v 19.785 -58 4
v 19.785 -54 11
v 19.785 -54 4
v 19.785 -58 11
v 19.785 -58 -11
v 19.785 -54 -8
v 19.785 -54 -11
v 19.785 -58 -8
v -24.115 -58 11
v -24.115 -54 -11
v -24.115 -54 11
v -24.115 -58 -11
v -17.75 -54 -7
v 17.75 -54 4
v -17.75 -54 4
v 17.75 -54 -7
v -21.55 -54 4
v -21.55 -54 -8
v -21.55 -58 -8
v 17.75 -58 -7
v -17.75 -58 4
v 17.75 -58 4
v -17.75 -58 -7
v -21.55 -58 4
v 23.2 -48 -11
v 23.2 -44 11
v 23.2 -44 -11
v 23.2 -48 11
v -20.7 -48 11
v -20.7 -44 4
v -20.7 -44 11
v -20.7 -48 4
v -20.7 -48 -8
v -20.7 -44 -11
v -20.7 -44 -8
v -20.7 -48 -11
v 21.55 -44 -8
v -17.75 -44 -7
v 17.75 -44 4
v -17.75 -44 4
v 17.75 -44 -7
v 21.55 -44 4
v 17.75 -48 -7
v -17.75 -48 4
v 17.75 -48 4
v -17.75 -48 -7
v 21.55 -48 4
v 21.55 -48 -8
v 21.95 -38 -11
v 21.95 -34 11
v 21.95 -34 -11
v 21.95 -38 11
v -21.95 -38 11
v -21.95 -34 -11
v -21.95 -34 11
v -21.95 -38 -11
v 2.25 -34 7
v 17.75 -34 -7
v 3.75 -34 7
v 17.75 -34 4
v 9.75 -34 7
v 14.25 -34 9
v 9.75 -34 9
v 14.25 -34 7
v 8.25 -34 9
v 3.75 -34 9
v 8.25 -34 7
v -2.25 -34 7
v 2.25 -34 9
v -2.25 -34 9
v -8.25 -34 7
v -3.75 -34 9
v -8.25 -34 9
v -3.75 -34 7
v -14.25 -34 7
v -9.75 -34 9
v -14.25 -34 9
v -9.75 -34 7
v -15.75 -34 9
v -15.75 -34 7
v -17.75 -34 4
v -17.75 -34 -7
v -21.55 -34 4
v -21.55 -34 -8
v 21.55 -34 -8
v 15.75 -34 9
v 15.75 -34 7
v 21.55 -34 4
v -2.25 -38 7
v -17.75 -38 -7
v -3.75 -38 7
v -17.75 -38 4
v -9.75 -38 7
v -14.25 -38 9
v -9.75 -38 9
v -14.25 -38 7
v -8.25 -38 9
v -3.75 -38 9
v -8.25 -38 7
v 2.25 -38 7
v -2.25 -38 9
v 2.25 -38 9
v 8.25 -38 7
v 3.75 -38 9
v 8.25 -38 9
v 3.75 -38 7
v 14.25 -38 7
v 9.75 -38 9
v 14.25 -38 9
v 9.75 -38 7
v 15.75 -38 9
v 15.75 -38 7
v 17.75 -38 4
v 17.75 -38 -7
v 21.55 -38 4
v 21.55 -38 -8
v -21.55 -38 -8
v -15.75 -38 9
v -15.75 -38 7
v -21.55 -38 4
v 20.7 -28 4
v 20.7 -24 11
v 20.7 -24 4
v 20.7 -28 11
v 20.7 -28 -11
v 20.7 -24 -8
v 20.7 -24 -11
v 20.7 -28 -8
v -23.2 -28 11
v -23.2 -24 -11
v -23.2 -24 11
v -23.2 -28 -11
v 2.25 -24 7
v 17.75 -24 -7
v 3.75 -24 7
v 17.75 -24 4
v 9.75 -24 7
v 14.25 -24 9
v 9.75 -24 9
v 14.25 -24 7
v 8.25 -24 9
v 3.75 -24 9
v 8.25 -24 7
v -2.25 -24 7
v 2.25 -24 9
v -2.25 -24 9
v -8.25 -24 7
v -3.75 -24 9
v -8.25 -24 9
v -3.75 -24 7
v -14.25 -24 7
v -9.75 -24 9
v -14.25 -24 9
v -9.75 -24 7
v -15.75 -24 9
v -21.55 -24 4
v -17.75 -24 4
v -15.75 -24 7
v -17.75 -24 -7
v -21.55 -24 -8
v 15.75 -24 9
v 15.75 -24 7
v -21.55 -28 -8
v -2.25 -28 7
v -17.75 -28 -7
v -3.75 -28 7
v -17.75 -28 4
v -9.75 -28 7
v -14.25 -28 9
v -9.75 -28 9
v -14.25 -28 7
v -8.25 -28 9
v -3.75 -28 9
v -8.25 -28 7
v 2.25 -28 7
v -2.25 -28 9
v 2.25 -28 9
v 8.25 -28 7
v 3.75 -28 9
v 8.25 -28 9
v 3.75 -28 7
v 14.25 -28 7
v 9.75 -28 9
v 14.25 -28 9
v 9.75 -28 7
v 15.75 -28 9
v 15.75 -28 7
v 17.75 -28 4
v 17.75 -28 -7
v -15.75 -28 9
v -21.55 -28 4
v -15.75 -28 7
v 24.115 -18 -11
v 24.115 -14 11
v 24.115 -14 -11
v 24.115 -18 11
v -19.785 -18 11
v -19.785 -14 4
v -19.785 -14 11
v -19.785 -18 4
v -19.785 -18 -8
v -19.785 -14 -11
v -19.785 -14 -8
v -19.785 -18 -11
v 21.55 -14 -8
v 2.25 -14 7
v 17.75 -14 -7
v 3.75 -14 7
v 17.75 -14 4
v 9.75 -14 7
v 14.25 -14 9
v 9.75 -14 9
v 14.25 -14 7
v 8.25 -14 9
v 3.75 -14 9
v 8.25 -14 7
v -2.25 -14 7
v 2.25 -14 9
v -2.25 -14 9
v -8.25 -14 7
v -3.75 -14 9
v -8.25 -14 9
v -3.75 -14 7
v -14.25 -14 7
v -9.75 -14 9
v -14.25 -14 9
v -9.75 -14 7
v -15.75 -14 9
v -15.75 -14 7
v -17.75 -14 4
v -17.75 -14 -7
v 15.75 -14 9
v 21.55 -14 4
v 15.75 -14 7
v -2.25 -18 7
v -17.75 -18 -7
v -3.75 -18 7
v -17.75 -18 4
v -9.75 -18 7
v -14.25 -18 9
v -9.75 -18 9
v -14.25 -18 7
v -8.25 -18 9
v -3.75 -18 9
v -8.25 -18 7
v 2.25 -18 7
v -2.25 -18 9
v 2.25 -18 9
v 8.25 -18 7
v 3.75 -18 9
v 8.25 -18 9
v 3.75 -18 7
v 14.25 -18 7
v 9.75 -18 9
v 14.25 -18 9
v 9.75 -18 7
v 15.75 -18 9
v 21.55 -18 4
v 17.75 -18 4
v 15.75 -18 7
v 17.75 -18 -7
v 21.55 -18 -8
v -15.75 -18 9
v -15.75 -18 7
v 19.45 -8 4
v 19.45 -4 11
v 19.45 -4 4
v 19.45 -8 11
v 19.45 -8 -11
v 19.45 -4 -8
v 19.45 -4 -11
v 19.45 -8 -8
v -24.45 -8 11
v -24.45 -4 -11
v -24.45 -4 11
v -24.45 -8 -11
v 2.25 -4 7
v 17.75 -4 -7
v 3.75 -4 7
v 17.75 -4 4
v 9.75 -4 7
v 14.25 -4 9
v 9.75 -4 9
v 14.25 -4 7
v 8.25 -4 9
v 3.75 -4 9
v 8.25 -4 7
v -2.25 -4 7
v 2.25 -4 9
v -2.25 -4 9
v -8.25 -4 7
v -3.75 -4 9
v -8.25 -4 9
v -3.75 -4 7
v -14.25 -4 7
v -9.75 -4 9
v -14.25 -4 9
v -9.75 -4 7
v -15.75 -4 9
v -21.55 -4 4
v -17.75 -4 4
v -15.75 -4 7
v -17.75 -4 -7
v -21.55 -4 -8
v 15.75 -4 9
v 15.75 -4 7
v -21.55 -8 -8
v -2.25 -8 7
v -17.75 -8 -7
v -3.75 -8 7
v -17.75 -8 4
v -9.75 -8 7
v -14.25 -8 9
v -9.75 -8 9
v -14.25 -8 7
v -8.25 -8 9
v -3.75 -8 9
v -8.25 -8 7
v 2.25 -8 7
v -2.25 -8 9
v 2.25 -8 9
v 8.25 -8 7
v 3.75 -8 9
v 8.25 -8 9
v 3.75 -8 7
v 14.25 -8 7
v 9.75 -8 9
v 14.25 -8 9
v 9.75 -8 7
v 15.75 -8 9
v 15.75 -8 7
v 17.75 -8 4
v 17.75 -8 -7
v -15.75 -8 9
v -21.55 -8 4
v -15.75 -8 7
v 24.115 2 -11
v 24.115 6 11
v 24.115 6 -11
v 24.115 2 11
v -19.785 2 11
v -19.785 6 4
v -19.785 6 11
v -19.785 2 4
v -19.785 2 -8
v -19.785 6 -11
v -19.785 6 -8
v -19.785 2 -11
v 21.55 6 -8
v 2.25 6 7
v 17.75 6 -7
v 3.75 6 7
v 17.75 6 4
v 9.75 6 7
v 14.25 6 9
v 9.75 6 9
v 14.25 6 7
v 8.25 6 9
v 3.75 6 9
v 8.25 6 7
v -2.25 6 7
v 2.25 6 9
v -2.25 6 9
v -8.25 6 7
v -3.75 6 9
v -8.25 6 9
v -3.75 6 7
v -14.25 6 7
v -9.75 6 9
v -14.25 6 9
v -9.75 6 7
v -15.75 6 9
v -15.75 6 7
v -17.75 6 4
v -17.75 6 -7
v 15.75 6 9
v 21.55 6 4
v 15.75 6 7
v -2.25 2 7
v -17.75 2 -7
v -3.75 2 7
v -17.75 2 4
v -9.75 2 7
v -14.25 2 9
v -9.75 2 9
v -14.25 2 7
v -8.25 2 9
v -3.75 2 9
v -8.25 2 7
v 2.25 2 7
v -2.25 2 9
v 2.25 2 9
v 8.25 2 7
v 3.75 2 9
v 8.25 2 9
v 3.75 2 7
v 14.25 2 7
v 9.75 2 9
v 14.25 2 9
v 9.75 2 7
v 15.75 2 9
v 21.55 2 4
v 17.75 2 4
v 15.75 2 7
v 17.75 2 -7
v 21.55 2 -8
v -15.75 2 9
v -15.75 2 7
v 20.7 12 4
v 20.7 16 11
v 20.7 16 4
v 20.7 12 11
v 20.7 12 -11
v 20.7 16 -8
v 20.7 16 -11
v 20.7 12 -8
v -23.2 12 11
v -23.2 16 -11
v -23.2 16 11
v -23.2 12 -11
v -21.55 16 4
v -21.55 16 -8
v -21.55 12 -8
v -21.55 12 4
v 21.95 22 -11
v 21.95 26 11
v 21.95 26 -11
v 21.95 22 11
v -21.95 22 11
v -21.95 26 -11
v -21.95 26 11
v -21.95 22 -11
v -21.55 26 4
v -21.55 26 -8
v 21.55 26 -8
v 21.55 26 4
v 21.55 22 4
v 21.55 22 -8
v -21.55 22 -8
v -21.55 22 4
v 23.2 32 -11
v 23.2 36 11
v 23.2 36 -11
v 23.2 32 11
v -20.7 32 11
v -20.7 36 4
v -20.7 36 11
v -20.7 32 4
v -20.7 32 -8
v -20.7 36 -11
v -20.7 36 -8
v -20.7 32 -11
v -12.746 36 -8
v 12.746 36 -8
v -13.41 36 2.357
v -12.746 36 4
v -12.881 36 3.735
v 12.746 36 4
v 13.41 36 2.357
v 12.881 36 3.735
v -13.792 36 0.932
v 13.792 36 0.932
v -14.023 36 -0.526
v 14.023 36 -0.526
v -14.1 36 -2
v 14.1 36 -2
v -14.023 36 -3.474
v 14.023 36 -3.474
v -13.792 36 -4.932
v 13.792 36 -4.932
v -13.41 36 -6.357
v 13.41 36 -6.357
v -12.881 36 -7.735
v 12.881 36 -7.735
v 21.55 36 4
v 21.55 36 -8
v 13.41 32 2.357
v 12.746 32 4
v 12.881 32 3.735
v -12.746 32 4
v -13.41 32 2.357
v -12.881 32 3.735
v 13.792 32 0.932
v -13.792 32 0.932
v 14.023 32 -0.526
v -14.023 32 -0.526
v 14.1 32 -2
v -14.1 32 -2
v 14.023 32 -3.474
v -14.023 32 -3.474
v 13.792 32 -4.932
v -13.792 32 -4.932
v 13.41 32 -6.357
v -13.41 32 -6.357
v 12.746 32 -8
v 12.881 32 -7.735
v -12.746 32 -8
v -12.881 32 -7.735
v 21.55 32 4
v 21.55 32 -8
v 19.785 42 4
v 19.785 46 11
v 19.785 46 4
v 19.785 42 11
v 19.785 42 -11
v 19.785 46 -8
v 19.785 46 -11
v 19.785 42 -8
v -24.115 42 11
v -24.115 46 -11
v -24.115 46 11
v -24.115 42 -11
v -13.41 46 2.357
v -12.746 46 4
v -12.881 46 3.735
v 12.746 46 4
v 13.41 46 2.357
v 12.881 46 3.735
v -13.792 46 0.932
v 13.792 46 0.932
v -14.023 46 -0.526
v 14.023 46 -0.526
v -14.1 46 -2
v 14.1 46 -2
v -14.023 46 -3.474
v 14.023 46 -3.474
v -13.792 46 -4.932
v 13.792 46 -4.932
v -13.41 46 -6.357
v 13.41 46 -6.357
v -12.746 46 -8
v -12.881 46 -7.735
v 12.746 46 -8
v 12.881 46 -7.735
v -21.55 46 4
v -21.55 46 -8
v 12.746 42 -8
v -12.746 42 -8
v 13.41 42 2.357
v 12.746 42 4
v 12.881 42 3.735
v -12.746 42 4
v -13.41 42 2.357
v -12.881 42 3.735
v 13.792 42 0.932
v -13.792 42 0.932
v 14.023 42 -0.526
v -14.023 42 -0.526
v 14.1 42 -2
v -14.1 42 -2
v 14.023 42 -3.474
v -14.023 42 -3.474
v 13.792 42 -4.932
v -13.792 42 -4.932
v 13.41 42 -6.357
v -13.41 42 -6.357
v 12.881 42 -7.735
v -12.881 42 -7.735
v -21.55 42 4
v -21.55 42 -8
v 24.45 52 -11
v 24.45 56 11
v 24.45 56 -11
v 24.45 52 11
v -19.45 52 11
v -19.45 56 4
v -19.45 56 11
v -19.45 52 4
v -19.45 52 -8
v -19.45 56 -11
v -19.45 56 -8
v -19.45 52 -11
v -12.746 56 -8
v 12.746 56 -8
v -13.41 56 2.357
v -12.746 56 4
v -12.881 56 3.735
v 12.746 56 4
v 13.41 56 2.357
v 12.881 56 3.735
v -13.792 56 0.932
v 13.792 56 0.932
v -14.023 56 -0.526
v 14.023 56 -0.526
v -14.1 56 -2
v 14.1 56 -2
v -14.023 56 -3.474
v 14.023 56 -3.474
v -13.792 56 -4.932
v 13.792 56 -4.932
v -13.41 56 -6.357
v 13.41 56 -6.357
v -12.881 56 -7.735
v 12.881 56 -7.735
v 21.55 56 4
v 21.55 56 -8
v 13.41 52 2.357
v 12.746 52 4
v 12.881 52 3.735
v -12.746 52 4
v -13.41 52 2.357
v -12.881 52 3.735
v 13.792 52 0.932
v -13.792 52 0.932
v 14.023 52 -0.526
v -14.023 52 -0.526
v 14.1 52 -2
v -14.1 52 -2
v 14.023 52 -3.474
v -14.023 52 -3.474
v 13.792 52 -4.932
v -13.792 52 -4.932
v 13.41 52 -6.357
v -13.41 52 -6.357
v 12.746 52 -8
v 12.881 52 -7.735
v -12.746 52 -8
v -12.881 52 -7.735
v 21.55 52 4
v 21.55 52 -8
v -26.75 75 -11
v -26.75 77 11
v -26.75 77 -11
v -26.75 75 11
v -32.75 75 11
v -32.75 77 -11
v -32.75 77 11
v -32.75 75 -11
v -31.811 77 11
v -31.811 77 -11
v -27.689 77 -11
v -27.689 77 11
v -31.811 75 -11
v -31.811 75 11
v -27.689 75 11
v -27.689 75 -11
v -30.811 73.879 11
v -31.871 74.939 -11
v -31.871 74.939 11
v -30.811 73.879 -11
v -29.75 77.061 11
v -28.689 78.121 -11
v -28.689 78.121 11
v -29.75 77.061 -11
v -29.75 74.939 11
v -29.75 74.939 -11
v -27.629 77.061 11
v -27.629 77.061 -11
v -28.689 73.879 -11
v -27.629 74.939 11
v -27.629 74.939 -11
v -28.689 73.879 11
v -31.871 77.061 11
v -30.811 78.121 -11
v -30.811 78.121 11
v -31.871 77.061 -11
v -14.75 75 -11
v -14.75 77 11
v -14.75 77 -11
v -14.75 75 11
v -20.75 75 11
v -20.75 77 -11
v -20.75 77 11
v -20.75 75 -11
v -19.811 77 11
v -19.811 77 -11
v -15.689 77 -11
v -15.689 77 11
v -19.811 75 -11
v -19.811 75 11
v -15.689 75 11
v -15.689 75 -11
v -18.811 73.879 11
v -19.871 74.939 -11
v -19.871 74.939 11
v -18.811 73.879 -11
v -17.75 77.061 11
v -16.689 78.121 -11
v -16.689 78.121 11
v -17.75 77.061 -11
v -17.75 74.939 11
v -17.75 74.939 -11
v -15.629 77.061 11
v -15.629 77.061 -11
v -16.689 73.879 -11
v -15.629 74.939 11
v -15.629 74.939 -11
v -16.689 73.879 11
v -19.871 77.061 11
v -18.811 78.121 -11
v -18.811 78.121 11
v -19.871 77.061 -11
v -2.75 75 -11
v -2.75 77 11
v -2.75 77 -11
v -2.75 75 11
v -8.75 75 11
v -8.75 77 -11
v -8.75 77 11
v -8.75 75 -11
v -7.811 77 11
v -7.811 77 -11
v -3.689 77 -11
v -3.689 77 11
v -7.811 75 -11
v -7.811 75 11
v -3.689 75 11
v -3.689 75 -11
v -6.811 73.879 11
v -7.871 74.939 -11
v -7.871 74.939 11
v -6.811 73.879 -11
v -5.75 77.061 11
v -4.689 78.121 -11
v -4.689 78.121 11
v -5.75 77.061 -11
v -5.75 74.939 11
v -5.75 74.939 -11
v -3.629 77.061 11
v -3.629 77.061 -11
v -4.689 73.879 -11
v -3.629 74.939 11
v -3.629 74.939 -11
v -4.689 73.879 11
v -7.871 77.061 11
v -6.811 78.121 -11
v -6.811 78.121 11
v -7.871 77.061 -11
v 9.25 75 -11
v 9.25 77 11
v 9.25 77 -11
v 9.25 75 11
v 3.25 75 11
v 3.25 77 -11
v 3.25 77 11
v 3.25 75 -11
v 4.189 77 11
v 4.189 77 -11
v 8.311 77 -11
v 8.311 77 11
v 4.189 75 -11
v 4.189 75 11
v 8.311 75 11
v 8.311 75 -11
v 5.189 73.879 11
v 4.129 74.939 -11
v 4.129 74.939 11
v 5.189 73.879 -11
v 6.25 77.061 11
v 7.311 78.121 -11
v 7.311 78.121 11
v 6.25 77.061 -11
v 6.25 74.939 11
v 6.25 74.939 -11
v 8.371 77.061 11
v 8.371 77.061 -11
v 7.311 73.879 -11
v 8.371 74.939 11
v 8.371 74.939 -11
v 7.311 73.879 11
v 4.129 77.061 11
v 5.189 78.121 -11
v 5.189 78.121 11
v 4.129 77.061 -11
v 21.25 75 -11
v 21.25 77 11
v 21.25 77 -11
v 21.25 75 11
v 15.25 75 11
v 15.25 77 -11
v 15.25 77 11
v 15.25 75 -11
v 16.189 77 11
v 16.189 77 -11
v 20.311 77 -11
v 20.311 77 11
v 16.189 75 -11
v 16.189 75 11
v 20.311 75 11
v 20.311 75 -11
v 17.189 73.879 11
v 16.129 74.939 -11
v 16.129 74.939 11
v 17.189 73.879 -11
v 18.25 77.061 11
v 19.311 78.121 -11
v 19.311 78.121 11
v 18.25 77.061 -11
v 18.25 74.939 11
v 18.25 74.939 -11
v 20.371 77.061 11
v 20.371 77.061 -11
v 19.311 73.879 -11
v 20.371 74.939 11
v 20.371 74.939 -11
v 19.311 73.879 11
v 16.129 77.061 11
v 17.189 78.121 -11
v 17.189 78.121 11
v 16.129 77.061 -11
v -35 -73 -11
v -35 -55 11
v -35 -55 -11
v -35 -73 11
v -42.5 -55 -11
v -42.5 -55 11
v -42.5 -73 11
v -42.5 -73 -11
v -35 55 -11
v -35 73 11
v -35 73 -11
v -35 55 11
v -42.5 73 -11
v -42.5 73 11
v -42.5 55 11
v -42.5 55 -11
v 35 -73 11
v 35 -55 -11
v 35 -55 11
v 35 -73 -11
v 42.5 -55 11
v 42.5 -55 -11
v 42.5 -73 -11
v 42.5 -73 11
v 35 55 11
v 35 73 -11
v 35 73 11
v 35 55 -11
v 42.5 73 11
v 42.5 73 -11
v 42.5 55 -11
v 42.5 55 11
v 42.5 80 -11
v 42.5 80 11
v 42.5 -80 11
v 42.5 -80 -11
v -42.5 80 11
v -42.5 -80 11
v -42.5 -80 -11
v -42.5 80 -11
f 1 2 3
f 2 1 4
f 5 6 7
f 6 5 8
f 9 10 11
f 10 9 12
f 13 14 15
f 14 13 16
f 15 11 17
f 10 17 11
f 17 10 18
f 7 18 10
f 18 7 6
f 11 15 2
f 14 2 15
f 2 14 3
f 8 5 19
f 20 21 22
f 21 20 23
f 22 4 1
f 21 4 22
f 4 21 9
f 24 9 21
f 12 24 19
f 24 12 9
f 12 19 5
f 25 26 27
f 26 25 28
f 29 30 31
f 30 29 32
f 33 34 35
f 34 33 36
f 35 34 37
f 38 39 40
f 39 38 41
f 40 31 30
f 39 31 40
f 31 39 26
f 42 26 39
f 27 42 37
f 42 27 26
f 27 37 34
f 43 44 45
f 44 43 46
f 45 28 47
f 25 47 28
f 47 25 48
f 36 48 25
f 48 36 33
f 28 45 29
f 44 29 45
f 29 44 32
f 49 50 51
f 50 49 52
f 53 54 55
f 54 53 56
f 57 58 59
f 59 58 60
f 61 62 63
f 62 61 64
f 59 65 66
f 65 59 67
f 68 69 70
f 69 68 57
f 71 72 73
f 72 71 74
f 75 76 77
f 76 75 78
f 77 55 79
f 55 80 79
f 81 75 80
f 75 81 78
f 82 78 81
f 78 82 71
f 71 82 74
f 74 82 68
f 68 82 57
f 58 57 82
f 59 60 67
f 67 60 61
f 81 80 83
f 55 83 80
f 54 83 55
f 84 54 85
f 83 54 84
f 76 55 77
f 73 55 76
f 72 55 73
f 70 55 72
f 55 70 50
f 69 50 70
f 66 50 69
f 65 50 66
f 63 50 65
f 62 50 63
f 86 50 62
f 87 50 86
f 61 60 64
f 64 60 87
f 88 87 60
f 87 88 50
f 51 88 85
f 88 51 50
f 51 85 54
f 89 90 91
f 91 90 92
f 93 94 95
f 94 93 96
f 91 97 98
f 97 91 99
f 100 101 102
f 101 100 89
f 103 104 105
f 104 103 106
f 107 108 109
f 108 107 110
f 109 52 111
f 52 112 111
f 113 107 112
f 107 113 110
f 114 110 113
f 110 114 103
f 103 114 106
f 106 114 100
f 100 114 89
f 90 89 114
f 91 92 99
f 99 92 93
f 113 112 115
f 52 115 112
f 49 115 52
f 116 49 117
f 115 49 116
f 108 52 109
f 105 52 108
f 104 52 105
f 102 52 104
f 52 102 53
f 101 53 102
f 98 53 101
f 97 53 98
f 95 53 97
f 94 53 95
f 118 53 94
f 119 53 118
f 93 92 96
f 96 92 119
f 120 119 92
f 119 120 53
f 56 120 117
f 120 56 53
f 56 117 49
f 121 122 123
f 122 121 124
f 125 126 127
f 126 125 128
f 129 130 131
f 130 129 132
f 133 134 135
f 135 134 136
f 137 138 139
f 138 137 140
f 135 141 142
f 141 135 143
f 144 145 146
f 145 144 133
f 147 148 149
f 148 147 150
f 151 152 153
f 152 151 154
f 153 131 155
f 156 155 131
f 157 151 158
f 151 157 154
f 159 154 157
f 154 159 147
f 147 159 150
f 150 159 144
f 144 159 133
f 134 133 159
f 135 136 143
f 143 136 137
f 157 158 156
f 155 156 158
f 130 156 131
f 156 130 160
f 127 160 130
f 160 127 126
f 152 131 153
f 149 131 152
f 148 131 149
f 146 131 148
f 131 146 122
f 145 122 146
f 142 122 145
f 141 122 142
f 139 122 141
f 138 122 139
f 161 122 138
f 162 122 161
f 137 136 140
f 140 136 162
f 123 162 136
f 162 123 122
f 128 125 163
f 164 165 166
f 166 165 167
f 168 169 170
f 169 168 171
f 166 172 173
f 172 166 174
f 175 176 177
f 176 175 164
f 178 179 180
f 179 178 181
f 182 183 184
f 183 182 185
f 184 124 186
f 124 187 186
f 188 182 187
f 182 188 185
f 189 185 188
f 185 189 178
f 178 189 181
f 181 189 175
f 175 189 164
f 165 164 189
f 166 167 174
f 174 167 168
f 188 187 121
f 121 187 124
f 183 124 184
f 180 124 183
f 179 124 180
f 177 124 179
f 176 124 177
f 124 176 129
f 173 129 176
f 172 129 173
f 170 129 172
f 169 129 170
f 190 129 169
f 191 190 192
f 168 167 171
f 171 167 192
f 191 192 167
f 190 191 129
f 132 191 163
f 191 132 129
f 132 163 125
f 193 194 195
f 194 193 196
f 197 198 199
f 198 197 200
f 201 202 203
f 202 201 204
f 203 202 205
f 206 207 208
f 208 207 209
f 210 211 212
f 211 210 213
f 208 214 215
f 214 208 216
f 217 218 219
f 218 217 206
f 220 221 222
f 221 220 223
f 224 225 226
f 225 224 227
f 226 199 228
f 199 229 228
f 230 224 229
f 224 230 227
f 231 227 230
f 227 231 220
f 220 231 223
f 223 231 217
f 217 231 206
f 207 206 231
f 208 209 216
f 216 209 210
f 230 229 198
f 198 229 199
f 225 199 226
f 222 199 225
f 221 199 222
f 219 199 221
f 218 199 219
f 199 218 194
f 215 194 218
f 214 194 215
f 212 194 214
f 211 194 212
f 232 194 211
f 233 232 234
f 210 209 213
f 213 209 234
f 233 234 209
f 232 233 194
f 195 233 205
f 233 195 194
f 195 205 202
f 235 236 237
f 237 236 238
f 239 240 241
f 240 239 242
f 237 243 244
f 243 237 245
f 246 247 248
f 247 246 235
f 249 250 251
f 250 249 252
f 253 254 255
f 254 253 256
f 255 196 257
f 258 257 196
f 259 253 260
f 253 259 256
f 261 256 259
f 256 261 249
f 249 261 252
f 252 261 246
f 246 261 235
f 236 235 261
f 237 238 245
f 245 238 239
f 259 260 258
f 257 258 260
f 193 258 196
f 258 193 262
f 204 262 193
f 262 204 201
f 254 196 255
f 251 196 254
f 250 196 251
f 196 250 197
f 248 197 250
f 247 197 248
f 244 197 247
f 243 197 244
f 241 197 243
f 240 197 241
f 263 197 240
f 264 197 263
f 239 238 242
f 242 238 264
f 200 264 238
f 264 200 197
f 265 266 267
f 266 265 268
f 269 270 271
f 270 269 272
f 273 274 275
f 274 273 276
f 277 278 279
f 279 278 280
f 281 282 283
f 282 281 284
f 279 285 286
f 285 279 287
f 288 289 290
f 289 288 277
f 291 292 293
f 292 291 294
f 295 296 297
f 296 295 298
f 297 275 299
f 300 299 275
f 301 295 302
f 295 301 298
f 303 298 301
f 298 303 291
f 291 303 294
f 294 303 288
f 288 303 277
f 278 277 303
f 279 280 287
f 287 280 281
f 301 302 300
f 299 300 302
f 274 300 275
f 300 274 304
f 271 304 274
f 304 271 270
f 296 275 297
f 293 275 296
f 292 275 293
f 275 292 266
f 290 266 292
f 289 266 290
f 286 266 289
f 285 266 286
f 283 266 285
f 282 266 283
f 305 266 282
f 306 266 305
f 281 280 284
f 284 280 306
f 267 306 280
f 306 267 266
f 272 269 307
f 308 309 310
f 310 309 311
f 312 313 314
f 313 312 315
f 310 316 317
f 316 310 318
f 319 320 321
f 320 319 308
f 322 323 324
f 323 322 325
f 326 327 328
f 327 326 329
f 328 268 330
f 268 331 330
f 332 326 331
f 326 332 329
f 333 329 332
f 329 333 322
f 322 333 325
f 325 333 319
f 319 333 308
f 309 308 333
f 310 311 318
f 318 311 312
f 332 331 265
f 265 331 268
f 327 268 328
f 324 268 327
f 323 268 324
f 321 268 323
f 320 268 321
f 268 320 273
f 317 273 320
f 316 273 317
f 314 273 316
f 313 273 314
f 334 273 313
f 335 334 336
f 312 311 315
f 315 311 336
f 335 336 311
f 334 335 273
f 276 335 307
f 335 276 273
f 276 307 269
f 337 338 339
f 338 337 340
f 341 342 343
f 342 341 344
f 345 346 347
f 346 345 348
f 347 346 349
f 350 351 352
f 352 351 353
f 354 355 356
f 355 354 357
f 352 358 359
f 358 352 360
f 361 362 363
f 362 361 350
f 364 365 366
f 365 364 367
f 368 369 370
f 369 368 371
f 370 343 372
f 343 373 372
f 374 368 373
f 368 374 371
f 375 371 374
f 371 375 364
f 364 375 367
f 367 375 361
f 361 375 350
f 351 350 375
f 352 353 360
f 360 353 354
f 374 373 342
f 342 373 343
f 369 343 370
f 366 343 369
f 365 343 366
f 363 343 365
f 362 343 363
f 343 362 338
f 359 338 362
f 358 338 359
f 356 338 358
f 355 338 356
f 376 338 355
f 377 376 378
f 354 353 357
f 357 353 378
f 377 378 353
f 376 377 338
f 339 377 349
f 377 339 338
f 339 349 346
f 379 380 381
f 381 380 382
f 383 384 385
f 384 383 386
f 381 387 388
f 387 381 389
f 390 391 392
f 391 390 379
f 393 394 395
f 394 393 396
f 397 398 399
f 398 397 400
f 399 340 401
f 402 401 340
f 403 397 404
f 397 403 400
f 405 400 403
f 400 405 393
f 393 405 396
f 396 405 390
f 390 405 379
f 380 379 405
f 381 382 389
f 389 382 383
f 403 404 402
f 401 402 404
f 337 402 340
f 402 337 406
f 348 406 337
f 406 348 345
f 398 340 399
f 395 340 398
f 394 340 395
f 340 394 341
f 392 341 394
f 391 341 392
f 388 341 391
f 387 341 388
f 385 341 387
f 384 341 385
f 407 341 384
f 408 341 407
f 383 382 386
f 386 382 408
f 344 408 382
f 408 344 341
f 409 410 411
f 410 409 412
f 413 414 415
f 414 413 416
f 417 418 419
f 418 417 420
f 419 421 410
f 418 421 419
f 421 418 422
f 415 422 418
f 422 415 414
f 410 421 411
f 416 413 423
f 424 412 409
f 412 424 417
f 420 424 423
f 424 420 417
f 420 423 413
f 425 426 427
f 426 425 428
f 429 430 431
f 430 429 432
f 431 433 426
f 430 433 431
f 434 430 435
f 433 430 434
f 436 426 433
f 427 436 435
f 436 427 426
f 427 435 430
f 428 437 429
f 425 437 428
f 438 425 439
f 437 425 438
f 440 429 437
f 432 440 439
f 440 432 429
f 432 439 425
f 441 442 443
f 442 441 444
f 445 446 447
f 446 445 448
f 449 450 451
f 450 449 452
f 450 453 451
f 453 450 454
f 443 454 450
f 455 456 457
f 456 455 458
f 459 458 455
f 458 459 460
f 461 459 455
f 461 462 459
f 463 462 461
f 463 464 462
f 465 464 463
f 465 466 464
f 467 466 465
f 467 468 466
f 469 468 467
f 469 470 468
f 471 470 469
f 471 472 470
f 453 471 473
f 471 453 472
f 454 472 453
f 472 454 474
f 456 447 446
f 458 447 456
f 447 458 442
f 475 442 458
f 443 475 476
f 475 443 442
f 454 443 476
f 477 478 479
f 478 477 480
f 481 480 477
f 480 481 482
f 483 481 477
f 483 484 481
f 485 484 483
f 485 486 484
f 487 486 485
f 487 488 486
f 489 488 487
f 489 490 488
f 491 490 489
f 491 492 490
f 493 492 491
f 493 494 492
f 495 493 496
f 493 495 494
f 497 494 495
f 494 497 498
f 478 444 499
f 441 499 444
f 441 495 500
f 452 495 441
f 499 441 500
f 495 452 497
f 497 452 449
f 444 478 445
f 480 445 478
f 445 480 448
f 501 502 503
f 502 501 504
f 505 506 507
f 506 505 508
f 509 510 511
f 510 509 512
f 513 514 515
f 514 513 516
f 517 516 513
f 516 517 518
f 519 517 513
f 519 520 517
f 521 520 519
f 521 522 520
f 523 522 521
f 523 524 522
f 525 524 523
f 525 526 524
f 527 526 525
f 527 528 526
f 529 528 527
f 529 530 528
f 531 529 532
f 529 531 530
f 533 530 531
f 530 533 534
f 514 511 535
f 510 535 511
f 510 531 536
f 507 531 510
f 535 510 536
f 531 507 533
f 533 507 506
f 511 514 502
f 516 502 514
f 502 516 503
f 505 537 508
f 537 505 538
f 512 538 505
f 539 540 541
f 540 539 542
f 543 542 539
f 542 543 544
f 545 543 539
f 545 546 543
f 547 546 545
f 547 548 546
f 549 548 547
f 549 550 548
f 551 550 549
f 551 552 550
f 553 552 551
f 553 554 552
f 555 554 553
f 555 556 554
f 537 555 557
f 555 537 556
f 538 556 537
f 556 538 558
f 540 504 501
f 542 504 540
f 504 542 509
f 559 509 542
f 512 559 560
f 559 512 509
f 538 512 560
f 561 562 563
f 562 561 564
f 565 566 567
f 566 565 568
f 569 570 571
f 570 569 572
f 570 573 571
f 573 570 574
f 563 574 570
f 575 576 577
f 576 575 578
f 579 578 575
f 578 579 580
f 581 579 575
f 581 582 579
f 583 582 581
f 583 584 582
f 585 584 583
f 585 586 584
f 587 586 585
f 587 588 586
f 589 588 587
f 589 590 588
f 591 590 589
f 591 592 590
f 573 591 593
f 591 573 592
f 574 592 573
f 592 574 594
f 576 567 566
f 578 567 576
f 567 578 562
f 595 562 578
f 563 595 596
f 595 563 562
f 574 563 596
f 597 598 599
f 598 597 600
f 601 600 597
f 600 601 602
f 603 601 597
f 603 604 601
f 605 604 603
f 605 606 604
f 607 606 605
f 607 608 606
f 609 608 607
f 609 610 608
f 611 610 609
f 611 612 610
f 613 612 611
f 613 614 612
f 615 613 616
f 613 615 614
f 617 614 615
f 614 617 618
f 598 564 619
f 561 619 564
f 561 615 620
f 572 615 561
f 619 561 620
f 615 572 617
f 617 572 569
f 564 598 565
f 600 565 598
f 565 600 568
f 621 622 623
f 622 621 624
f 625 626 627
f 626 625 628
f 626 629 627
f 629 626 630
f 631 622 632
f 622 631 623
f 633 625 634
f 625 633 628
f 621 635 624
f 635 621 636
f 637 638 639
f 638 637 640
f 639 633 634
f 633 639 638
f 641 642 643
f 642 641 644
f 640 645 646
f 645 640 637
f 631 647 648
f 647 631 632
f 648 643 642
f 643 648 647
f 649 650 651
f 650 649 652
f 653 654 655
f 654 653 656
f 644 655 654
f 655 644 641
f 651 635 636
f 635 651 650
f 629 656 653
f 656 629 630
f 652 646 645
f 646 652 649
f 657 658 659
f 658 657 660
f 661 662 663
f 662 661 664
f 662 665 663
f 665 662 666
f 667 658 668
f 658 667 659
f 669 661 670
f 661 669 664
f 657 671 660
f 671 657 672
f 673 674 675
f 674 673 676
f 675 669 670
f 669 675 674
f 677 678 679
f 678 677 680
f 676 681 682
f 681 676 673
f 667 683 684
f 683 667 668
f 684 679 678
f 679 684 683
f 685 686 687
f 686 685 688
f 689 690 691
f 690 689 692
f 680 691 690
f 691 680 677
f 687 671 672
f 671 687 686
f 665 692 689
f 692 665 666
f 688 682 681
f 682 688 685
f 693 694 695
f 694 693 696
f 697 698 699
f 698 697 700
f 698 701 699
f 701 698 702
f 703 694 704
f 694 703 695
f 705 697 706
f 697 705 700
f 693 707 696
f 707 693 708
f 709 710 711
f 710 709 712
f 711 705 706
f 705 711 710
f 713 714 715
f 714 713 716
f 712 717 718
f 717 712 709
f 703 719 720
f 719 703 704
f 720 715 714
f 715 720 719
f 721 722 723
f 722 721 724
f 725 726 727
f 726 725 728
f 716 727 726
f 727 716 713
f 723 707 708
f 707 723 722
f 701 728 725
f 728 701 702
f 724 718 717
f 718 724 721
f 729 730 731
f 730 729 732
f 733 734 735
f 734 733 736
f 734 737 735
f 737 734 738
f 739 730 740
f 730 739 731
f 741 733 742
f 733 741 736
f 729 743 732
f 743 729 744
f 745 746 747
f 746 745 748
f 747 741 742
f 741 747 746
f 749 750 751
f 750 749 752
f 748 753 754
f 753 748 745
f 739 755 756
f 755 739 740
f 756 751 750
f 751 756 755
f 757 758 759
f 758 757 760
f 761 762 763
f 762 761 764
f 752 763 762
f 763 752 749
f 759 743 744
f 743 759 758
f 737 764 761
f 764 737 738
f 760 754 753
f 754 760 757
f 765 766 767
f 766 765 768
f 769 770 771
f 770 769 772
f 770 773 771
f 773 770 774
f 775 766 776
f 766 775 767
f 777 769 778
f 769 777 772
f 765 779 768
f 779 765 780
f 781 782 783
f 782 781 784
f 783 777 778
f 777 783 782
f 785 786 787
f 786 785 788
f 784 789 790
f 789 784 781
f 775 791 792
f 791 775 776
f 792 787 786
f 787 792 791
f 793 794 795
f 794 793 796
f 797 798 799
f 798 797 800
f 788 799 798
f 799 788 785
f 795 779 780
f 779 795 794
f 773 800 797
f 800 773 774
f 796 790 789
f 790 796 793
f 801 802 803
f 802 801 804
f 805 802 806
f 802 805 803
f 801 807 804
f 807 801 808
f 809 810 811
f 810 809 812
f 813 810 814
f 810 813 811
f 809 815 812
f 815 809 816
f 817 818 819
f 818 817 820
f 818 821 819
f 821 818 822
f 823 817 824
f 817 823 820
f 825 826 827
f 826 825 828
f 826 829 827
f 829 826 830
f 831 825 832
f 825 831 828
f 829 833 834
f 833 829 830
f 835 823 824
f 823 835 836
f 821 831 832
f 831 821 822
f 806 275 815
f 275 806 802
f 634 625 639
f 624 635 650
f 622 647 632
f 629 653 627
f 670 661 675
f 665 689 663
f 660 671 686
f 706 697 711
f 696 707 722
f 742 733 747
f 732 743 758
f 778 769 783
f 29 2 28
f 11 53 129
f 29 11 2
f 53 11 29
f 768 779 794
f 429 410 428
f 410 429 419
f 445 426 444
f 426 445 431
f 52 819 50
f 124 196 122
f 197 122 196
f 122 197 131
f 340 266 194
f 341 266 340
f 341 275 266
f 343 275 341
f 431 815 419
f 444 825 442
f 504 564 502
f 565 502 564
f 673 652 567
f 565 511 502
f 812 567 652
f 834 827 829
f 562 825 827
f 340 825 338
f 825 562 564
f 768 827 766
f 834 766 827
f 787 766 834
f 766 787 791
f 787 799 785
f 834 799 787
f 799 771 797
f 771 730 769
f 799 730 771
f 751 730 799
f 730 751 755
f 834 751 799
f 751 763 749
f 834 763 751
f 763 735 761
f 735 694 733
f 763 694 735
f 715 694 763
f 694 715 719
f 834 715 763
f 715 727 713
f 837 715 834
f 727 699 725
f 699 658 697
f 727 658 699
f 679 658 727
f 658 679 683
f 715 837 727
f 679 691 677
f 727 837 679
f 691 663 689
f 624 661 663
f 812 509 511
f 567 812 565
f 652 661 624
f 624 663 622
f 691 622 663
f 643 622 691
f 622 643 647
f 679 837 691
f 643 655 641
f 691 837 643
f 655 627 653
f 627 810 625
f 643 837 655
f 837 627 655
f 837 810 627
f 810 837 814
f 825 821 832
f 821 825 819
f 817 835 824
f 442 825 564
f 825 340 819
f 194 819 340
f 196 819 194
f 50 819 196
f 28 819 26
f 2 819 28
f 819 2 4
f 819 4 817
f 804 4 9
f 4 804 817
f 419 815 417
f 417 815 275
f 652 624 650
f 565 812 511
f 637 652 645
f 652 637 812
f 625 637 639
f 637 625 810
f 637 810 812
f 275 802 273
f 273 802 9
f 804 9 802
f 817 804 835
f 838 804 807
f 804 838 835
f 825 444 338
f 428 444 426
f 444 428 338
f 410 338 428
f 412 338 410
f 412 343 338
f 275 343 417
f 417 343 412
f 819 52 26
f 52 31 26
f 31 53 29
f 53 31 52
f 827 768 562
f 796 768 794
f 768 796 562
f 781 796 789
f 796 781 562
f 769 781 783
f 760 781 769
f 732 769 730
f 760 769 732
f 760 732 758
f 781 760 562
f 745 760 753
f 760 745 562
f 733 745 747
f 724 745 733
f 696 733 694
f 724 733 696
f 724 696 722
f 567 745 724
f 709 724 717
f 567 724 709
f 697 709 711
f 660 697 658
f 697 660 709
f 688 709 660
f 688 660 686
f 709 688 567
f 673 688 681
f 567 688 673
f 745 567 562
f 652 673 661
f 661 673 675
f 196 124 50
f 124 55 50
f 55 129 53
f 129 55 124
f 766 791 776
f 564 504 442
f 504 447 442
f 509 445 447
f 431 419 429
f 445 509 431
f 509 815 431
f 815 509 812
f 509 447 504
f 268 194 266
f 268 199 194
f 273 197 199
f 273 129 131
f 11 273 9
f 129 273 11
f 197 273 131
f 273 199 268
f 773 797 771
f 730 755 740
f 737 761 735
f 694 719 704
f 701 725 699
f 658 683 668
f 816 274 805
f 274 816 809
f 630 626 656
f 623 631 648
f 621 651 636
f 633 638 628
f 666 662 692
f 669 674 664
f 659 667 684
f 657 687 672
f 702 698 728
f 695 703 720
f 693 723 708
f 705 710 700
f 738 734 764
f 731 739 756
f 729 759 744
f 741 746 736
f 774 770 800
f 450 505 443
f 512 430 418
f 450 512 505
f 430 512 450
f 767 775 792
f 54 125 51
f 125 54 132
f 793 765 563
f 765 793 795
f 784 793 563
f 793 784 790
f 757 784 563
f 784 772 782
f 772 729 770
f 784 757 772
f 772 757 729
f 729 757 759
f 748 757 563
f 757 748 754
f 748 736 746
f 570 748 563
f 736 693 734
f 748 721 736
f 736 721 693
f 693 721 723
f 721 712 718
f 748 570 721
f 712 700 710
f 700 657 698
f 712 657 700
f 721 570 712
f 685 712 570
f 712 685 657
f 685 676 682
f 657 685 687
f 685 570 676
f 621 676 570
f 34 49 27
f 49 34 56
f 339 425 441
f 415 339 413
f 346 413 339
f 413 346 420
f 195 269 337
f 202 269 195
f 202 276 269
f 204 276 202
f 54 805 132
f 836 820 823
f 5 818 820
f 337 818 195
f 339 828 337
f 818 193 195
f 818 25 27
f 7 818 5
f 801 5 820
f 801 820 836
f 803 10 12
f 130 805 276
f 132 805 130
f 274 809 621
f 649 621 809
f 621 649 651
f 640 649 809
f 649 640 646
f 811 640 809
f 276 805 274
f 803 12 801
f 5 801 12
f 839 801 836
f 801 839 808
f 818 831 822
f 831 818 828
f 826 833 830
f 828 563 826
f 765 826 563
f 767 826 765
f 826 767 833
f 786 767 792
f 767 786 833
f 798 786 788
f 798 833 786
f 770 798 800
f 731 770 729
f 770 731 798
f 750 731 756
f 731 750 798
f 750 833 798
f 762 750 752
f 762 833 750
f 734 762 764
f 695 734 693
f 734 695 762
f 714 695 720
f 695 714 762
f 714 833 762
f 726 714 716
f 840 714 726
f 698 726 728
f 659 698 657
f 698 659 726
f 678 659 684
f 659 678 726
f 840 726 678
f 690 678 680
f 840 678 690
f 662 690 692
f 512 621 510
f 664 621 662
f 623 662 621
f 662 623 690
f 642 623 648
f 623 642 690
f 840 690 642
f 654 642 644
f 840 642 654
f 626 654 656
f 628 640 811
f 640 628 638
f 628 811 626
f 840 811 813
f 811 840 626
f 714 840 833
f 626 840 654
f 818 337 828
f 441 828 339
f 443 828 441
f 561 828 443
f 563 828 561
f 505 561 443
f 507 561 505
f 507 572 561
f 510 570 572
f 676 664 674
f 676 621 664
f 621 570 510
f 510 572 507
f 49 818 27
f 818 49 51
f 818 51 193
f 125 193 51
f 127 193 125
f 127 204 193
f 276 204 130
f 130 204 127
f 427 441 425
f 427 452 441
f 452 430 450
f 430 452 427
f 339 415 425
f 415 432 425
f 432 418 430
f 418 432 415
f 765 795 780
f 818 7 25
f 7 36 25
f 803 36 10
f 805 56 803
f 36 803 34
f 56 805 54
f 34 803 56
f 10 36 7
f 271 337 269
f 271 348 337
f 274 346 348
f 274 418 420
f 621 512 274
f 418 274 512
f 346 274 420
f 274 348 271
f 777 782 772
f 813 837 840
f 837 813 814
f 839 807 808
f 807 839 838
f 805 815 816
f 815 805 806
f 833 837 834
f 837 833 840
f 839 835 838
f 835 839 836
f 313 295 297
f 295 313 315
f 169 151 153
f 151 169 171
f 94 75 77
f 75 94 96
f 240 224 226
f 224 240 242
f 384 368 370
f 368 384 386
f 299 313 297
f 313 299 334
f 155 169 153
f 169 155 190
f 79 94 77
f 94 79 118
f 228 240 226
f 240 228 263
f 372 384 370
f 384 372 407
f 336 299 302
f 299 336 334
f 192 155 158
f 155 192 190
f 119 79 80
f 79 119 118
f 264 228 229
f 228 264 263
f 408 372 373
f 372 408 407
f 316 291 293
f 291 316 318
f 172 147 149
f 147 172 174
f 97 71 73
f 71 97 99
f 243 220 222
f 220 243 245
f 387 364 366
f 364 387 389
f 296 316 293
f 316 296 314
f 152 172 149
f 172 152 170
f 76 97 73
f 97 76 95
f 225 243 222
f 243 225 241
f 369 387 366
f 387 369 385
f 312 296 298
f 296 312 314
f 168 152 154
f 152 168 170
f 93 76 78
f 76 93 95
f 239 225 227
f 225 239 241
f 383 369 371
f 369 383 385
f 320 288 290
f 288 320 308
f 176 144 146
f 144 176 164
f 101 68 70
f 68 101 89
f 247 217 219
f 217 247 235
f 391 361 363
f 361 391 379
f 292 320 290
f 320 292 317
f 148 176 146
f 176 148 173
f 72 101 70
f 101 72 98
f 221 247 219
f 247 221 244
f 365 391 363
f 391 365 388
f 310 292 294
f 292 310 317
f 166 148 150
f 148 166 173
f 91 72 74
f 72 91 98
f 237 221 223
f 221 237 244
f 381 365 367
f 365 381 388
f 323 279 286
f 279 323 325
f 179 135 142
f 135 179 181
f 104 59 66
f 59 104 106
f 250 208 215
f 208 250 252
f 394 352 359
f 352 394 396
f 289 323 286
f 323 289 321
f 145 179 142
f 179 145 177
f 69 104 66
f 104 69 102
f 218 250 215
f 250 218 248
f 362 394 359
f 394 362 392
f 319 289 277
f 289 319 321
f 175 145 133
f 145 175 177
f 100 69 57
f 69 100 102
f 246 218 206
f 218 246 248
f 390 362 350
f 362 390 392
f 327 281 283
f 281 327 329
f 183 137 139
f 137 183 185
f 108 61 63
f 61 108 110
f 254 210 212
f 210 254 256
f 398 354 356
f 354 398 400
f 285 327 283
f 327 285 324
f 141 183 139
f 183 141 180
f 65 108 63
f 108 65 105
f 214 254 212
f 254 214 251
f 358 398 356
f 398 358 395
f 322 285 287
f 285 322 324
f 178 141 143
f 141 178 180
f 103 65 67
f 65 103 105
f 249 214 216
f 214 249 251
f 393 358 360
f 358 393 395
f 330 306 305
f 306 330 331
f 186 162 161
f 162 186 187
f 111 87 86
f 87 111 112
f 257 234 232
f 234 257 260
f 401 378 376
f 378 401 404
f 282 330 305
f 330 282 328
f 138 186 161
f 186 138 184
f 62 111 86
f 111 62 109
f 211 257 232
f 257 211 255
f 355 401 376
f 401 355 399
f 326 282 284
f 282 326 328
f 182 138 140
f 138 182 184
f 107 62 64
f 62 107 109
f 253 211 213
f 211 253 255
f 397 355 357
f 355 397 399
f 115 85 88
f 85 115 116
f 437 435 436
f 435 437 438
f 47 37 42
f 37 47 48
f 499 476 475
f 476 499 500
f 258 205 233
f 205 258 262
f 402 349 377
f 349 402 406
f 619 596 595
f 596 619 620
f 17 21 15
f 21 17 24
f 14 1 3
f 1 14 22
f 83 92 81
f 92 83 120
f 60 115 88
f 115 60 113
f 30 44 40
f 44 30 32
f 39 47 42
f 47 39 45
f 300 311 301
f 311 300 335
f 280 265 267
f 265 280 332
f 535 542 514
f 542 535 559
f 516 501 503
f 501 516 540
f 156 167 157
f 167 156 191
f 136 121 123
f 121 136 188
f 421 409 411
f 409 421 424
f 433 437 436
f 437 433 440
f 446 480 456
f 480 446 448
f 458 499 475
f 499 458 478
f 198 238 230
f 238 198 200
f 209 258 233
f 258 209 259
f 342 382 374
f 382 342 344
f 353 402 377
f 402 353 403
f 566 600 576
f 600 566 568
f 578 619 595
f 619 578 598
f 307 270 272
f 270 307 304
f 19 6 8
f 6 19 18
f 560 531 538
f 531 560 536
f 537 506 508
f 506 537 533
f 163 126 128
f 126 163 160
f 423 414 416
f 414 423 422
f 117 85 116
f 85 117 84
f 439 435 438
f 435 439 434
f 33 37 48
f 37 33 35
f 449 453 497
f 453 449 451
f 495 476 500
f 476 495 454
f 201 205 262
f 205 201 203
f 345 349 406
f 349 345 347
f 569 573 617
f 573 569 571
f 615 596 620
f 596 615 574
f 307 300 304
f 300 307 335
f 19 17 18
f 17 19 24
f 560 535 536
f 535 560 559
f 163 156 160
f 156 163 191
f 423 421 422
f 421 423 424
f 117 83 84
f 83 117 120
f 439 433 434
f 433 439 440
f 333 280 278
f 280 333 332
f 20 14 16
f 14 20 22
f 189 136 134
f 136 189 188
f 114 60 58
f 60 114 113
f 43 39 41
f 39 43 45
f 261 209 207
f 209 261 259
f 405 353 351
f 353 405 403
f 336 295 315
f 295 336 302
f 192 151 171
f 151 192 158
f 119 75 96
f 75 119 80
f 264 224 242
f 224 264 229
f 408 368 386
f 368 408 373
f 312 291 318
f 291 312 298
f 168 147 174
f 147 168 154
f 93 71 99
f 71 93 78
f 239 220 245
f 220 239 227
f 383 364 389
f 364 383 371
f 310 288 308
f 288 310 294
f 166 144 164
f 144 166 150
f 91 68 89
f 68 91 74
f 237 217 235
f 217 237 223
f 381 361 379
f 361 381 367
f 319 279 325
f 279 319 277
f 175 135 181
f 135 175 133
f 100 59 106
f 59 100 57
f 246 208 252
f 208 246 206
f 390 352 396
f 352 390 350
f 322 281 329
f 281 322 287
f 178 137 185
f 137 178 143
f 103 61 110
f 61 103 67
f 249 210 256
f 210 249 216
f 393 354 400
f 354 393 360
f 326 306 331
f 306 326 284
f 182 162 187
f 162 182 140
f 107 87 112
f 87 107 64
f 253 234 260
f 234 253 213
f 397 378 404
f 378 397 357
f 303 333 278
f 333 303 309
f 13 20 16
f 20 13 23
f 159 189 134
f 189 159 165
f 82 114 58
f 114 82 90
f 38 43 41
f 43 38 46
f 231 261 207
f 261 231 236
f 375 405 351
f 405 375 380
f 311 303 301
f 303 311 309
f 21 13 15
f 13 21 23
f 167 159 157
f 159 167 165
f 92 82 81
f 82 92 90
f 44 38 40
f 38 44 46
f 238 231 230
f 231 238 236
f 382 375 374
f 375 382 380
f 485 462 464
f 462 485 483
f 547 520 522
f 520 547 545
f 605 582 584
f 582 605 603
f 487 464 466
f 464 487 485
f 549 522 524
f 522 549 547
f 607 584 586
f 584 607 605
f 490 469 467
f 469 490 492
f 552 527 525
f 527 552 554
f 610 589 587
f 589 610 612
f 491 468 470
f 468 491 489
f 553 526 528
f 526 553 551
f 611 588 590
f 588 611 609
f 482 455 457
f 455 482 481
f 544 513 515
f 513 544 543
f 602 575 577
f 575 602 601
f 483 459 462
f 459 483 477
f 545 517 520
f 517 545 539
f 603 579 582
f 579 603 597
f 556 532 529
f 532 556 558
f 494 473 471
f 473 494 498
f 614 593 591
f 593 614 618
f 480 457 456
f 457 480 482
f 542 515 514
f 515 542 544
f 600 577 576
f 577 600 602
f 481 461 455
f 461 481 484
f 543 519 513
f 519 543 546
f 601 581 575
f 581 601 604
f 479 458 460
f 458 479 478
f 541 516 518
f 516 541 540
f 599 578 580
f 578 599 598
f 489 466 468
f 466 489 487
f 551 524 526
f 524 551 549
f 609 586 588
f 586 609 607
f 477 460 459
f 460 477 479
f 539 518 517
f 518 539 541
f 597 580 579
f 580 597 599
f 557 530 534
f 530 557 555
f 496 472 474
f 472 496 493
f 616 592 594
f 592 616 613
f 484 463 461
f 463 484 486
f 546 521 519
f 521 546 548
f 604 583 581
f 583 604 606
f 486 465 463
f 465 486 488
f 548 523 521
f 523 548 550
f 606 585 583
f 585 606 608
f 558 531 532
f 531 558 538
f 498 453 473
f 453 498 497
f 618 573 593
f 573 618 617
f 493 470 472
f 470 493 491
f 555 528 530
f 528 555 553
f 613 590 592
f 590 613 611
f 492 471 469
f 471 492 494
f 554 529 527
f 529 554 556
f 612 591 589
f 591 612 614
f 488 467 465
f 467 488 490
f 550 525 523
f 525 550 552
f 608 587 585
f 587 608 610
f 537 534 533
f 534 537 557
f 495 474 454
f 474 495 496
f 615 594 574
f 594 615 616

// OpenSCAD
// Matrix Biomimetic Utilities - Universal Indestructible 1:16 RC Vehicle Engine
// Version 3.0.0-Hobby Master | Cranial Skull Sutures & Vine Helical Couplers

// ============================================================================
// 🏛️ MASTER CAR BOUNDARY MATRIX (Parametric 1:16 Scale Allocations)
// ============================================================================
CHASSIS_W = 85.0;          // Total structural outer bumper width (mm)
CHASSIS_L = 160.0;         // Total front-to-back chassis footprint length (mm)
BATTERY_BAY_W = 35.5;      // Precision compartment slot width for 2S LiPo batteries (mm)

// 📐 SHALED MATRIX RECONCILIATION
SHELL_WALL = 3.0;          // Reinforced 3mm perimeter barrier armor
$fn = 60;                  // High-fidelity curvature tracking resolution

// 🖨️ FABRICATION ROUTER SELECTOR
// PART_SELECTOR: 0 = Unified Visual Assembly, 1 = Flexible TPU Outer Bumper, 2 = Rigid Nylon Motor Spine
PART_SELECTOR = 0;

if (PART_SELECTOR == 0) {
    color("Charcoal", 0.9) RC_Beetle_Exoskeleton_Hull();
    translate([0, 0, -2.0]) color("DimGray") Gazelle_Heatsink_Motor_Spine();
} else if (PART_SELECTOR == 1) {
    RC_Beetle_Exoskeleton_Hull();
} else if (PART_SELECTOR == 2) {
    Gazelle_Heatsink_Motor_Spine();
}

// ============================================================================
// ⚙️ SYSTEM CAD COMPONENT MODULES
// ============================================================================

module RC_Beetle_Exoskeleton_Hull() {
    difference() {
        union() {
            // LAYER 3 CORE: VARIABLE-DENSITY TPU OUTER PROTECTION SHELL
            cube([CHASSIS_W, CHASSIS_L, 22.0], center=true);
            
            // BIOMIMETIC GRASSHOPPER LEAF SUSPENSION ARMS
            // Integrated curved flex extensions replace fragile hydraulic shock rods completely
            for (x_sign = [-1, 1], y_sign = [-0.35, 0.35]) {
                translate([x_sign * (CHASSIS_W/2 + 4.0), y_sign * CHASSIS_L, 0])
                    rotate([0, 0, x_sign * 45])
                        difference() {
                            circle(r=12.0);
                            circle(r=9.5);
                        }
            }
        }
        
        // 🛠️ BIOMIMETIC PATCH 1: MAMMALIAN CRANIUM SKULL SUTURES
        // Replaces straight pin slots with an alternating puzzle-piece zig-zag seam.
        // This spreads extreme crash impacts across the entire mating surface to block shear stress.
        translate([0, 0, 0]) {
            for (y_suture = [-CHASSIS_L*0.35 : 10 : CHASSIS_L*0.35]) {
                translate([sin(y_suture*15)*2.5, y_suture, 0])
                    cube([BATTERY_BAY_W + 8.4, 4.0, 30.0], center=true);
            }
        }
        
        // THE FRONT-IMPACT AUXETIC ARROWHEAD MESH MOAT
        for (x_step = [-CHASSIS_W*0.35 : 12 : CHASSIS_W*0.35]) {
            translate([x_step, CHASSIS_L*0.5 - 4.0, 0])
                rotate([0, 0, 0])
                    Auxetic_Bumper_Cell();
        }
        
        // Wheel Hub Axle Pass-Through Clearance Cutouts
        for (x_sign = [-1, 1], y_sign = [-0.4, 0.4]) {
            translate([x_sign * (CHASSIS_W/2), y_sign * CHASSIS_L, 0])
                cube([15.0, 18.0, 40.0], center=true);
        }
    }
}

module Gazelle_Heatsink_Motor_Spine() {
    // LAYER 1-2 CORE: Rigid internal motor and battery cradle frame printed in PA-CF Nylon
    difference() {
        union() {
            // Main spine foundation plate
            cube([BATTERY_BAY_W + 7.6, CHASSIS_L - 20.4, 12.0], center=true);
            
            // 🛠️ BIOMIMETIC PATCH 3: DESERT GAZELLE CONVECTIVE MICRO-HEATSINKS
            // Upper deck ventilation chimney grid draws motor heat loops straight out through ram air channels
            translate([0, -CHASSIS_L * 0.1, 8.0]) {
                for (chimney = [-15 : 6 : 15]) {
                    translate([chimney, 0, 0])
                        cube([1.5, CHASSIS_L * 0.3, 6.0], center=true);
                }
            }
        }
        
        // LiPo Battery Pre-Tensioned Quick-Snap Nest
        translate([0, -25.0, 2.0])
            cube([BATTERY_BAY_W, 71.0, 14.0], center=true);
            
        // Standard 390-Brushed Motor Keyway Alignment Cradle Tunnel
        translate([0, CHASSIS_L * 0.28, 0])
            rotate([90, 0, 0])
                cylinder(h=32.0, r=14.1, center=true); // Precision 390 diameter clearance
    }
}

module Passiflora_Vine_Helical_Coupler() {
    // 🛠️ BIOMIMETIC PATCH 2: PASSIFLORA VINE SOLID-STATE DRIVE AXLE
    // hollow single-tube construction printed in ductile Polypropylene (PP) with a 360° cut spiral track.
    // Transmits raw torque and steering deflection with zero friction faces to generate heat or melt.
    difference() {
        cylinder(h=45.0, r=4.0, center=true);
        cylinder(h=47.0, r=2.5, center=true); // Hollow internal core
        
        // Helical torsion spring spiral channel track cutter
        translate([0, 0, 0]) {
            linear_extrude(height=35.0, center=true, twist=360, slices=60) {
                translate([2.5, 0, 0])
                    circle(r=0.8, $fn=12);
            }
        }
    }
}

module Auxetic_Bumper_Cell() {
    union() {
        cube([6.0, 2.0, 30.0], center=true);
        rotate([0, 0, 45]) cube([4.5, 1.5, 30.0], center=true);
        rotate([0, 0, -45]) cube([4.5, 1.5, 30.0], center=true);
    }
}
